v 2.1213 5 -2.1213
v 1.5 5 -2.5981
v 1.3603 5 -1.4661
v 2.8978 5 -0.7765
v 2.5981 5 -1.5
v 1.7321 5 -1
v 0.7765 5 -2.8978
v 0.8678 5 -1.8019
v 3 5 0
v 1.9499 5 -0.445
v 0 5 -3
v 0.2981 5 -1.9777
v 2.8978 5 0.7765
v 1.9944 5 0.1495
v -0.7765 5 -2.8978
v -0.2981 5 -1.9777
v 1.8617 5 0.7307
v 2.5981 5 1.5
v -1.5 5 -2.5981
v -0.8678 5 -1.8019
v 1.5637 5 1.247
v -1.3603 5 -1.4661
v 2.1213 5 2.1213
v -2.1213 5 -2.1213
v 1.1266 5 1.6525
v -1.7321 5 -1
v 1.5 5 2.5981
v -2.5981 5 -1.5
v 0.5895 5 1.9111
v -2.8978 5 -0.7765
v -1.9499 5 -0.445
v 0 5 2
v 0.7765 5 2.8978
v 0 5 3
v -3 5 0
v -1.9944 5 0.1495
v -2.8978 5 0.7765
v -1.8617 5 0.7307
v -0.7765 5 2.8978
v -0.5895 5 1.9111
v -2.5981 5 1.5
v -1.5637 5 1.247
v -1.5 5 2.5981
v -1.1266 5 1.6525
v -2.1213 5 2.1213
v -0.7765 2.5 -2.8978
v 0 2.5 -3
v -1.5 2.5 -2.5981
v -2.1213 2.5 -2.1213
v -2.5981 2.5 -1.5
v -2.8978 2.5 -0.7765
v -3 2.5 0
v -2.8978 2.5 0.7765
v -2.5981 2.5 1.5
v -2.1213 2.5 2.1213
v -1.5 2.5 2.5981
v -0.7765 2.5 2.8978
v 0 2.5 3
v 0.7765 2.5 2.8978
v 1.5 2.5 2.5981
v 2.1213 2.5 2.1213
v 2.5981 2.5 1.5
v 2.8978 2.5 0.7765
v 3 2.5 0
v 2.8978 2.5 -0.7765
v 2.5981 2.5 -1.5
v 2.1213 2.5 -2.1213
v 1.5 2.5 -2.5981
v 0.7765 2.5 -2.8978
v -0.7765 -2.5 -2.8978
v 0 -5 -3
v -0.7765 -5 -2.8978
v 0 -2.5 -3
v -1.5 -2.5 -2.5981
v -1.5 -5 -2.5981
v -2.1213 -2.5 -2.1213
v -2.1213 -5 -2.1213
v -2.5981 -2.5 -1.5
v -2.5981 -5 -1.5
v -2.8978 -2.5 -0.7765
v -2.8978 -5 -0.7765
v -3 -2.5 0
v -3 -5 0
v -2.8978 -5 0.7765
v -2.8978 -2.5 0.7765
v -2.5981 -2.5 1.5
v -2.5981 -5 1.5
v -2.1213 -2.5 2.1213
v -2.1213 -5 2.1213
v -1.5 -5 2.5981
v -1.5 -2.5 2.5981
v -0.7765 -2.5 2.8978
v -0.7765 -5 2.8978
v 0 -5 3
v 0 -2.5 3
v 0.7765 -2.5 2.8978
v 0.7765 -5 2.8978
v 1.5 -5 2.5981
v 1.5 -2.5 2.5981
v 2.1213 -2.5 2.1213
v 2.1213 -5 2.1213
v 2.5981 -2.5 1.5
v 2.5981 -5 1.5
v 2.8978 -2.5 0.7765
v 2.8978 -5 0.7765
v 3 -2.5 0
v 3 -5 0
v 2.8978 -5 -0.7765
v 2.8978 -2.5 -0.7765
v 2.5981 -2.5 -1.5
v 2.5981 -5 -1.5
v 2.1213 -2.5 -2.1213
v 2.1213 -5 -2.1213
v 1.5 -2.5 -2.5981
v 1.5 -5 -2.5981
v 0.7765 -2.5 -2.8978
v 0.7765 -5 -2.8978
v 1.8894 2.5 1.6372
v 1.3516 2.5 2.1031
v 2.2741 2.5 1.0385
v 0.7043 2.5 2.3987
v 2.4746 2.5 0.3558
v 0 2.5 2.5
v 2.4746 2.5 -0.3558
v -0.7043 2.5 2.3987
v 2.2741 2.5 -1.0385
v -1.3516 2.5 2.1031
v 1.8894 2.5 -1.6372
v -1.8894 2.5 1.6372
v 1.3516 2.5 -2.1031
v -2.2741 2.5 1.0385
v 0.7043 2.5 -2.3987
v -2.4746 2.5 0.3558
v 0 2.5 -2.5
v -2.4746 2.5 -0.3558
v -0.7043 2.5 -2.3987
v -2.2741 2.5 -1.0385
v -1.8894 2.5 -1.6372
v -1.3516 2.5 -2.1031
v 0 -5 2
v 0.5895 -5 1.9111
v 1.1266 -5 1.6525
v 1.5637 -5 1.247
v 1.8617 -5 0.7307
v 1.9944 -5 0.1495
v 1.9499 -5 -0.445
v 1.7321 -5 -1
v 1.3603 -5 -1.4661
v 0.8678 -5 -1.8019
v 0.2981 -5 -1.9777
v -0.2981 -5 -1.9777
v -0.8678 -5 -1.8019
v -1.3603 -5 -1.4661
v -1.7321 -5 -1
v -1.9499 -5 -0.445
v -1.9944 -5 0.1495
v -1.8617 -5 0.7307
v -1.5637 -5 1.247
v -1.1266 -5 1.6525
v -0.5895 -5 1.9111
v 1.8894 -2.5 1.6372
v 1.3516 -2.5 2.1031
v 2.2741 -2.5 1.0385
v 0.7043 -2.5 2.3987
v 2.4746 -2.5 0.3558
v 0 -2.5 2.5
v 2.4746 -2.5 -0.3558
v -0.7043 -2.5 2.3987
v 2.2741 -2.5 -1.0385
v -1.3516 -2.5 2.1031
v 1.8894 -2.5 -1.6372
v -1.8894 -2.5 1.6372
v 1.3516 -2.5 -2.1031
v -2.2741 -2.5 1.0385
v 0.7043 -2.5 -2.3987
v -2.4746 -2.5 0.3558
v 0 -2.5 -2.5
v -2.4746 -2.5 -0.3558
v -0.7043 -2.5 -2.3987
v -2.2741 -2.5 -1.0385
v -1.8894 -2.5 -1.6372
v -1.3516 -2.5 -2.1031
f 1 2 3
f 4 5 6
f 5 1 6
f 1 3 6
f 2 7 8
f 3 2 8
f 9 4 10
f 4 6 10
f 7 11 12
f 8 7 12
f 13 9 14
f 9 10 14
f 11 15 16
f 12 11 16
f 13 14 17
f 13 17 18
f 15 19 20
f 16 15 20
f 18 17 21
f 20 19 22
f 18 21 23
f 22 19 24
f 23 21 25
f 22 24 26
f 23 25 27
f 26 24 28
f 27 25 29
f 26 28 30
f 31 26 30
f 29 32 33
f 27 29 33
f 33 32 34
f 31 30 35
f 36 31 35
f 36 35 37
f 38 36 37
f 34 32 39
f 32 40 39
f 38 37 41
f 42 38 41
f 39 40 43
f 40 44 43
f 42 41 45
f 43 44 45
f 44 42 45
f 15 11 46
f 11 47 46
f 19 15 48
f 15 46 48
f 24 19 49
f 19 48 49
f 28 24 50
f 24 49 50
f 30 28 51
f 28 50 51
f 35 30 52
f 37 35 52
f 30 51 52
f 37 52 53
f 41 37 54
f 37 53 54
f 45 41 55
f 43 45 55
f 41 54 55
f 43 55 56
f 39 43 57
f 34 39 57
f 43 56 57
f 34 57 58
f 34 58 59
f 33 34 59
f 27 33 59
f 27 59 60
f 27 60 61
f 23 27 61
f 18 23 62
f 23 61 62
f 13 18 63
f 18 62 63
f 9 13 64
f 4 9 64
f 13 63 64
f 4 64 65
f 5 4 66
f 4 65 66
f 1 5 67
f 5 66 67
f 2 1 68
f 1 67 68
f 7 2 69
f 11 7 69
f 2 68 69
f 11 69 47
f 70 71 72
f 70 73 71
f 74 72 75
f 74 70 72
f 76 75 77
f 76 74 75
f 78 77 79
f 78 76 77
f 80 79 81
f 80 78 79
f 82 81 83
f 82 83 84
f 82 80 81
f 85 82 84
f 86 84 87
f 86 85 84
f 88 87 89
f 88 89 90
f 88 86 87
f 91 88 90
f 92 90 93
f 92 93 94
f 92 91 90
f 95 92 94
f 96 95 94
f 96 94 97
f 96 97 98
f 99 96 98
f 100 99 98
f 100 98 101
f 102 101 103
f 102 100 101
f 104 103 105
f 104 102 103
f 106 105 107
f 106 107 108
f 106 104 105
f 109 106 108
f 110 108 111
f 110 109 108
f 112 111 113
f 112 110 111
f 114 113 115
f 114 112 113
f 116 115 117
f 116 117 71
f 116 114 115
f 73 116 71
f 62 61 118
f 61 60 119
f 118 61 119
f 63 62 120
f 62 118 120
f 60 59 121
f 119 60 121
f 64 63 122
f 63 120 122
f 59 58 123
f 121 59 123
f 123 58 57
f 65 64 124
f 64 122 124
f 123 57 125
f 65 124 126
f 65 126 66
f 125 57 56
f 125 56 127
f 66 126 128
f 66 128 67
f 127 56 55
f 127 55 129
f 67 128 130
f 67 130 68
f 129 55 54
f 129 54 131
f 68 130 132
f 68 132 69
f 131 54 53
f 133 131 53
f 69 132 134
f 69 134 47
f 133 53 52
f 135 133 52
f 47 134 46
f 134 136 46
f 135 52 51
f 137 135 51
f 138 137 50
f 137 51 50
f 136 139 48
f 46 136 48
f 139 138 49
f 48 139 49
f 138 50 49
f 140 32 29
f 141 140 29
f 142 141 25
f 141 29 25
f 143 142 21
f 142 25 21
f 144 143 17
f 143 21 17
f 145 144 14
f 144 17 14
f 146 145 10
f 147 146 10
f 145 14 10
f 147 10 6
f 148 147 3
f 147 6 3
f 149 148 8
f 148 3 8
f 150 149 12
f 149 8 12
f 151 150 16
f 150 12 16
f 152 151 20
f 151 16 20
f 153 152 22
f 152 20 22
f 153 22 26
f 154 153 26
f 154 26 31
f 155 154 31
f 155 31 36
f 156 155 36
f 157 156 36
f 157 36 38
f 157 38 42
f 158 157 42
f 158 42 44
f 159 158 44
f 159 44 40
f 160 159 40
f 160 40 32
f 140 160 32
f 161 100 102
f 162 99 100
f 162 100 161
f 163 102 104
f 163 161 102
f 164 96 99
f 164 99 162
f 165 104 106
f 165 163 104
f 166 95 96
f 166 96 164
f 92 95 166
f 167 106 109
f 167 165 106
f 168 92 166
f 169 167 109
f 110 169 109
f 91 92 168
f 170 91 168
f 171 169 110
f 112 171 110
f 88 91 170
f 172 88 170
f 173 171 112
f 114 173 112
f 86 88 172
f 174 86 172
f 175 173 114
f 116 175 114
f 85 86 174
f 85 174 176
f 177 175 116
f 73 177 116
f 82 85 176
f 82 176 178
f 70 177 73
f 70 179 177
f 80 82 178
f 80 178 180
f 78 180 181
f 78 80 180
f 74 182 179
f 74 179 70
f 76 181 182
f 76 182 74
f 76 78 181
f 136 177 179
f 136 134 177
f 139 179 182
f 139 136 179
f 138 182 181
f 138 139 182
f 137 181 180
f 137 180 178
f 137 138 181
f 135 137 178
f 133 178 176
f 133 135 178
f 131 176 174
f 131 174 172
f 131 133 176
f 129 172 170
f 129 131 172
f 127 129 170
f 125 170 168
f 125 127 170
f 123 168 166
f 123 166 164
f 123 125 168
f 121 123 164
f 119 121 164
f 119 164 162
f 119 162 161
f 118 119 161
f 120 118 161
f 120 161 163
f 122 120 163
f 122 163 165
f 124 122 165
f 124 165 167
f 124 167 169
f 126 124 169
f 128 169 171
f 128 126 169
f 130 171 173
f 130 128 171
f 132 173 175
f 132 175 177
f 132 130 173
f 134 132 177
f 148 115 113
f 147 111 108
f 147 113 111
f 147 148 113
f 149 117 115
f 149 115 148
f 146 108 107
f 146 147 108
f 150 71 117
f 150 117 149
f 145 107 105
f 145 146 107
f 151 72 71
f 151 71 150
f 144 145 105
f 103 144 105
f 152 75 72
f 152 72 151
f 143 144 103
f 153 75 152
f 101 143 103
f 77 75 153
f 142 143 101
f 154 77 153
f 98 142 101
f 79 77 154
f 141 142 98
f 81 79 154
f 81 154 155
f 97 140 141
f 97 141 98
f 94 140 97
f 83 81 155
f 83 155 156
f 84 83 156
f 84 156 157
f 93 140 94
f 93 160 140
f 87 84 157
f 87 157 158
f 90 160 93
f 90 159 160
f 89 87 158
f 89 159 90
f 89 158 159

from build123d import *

# Parameters (mm, degrees)
SKETCH2_R          = 2
CUT_EXTRUDE1_DEPTH = 11.862780491


with BuildPart() as part:
    # Sketch1 → Revolve1 (revolve)
    with BuildSketch(Plane.XY, mode=Mode.PRIVATE) as revolve1_sk:
        Polygon((0, 0), (0, 5), (-3, 5), (-3, 2.5), (-2.5, 2.5), (-2.5, 0), align=None)
    revolve1 = revolve(revolve1_sk.sketch.rotate(Axis((0, 0, 0), (0, 1, 0)), 270), axis=Axis((0, 0, 0), (0, 1, 0)))

    # Mirror1: Revolve1 across plane
    add(revolve1.mirror(Plane(origin=(-2.5, 0, 0), x_dir=(0, 0, 1), z_dir=(0, 1, 0))))

    # Sketch2 → Cut-Extrude1 (cut, through all)
    with BuildSketch(Plane(origin=(0, 5, 0), x_dir=(1, 0, 0), z_dir=(0, 1, 0))):
        with Locations(Location((0, 0, 0), (0, 0, 270))):
            Circle(SKETCH2_R)
    extrude(amount=-CUT_EXTRUDE1_DEPTH, mode=Mode.SUBTRACT)


solid = part.part
